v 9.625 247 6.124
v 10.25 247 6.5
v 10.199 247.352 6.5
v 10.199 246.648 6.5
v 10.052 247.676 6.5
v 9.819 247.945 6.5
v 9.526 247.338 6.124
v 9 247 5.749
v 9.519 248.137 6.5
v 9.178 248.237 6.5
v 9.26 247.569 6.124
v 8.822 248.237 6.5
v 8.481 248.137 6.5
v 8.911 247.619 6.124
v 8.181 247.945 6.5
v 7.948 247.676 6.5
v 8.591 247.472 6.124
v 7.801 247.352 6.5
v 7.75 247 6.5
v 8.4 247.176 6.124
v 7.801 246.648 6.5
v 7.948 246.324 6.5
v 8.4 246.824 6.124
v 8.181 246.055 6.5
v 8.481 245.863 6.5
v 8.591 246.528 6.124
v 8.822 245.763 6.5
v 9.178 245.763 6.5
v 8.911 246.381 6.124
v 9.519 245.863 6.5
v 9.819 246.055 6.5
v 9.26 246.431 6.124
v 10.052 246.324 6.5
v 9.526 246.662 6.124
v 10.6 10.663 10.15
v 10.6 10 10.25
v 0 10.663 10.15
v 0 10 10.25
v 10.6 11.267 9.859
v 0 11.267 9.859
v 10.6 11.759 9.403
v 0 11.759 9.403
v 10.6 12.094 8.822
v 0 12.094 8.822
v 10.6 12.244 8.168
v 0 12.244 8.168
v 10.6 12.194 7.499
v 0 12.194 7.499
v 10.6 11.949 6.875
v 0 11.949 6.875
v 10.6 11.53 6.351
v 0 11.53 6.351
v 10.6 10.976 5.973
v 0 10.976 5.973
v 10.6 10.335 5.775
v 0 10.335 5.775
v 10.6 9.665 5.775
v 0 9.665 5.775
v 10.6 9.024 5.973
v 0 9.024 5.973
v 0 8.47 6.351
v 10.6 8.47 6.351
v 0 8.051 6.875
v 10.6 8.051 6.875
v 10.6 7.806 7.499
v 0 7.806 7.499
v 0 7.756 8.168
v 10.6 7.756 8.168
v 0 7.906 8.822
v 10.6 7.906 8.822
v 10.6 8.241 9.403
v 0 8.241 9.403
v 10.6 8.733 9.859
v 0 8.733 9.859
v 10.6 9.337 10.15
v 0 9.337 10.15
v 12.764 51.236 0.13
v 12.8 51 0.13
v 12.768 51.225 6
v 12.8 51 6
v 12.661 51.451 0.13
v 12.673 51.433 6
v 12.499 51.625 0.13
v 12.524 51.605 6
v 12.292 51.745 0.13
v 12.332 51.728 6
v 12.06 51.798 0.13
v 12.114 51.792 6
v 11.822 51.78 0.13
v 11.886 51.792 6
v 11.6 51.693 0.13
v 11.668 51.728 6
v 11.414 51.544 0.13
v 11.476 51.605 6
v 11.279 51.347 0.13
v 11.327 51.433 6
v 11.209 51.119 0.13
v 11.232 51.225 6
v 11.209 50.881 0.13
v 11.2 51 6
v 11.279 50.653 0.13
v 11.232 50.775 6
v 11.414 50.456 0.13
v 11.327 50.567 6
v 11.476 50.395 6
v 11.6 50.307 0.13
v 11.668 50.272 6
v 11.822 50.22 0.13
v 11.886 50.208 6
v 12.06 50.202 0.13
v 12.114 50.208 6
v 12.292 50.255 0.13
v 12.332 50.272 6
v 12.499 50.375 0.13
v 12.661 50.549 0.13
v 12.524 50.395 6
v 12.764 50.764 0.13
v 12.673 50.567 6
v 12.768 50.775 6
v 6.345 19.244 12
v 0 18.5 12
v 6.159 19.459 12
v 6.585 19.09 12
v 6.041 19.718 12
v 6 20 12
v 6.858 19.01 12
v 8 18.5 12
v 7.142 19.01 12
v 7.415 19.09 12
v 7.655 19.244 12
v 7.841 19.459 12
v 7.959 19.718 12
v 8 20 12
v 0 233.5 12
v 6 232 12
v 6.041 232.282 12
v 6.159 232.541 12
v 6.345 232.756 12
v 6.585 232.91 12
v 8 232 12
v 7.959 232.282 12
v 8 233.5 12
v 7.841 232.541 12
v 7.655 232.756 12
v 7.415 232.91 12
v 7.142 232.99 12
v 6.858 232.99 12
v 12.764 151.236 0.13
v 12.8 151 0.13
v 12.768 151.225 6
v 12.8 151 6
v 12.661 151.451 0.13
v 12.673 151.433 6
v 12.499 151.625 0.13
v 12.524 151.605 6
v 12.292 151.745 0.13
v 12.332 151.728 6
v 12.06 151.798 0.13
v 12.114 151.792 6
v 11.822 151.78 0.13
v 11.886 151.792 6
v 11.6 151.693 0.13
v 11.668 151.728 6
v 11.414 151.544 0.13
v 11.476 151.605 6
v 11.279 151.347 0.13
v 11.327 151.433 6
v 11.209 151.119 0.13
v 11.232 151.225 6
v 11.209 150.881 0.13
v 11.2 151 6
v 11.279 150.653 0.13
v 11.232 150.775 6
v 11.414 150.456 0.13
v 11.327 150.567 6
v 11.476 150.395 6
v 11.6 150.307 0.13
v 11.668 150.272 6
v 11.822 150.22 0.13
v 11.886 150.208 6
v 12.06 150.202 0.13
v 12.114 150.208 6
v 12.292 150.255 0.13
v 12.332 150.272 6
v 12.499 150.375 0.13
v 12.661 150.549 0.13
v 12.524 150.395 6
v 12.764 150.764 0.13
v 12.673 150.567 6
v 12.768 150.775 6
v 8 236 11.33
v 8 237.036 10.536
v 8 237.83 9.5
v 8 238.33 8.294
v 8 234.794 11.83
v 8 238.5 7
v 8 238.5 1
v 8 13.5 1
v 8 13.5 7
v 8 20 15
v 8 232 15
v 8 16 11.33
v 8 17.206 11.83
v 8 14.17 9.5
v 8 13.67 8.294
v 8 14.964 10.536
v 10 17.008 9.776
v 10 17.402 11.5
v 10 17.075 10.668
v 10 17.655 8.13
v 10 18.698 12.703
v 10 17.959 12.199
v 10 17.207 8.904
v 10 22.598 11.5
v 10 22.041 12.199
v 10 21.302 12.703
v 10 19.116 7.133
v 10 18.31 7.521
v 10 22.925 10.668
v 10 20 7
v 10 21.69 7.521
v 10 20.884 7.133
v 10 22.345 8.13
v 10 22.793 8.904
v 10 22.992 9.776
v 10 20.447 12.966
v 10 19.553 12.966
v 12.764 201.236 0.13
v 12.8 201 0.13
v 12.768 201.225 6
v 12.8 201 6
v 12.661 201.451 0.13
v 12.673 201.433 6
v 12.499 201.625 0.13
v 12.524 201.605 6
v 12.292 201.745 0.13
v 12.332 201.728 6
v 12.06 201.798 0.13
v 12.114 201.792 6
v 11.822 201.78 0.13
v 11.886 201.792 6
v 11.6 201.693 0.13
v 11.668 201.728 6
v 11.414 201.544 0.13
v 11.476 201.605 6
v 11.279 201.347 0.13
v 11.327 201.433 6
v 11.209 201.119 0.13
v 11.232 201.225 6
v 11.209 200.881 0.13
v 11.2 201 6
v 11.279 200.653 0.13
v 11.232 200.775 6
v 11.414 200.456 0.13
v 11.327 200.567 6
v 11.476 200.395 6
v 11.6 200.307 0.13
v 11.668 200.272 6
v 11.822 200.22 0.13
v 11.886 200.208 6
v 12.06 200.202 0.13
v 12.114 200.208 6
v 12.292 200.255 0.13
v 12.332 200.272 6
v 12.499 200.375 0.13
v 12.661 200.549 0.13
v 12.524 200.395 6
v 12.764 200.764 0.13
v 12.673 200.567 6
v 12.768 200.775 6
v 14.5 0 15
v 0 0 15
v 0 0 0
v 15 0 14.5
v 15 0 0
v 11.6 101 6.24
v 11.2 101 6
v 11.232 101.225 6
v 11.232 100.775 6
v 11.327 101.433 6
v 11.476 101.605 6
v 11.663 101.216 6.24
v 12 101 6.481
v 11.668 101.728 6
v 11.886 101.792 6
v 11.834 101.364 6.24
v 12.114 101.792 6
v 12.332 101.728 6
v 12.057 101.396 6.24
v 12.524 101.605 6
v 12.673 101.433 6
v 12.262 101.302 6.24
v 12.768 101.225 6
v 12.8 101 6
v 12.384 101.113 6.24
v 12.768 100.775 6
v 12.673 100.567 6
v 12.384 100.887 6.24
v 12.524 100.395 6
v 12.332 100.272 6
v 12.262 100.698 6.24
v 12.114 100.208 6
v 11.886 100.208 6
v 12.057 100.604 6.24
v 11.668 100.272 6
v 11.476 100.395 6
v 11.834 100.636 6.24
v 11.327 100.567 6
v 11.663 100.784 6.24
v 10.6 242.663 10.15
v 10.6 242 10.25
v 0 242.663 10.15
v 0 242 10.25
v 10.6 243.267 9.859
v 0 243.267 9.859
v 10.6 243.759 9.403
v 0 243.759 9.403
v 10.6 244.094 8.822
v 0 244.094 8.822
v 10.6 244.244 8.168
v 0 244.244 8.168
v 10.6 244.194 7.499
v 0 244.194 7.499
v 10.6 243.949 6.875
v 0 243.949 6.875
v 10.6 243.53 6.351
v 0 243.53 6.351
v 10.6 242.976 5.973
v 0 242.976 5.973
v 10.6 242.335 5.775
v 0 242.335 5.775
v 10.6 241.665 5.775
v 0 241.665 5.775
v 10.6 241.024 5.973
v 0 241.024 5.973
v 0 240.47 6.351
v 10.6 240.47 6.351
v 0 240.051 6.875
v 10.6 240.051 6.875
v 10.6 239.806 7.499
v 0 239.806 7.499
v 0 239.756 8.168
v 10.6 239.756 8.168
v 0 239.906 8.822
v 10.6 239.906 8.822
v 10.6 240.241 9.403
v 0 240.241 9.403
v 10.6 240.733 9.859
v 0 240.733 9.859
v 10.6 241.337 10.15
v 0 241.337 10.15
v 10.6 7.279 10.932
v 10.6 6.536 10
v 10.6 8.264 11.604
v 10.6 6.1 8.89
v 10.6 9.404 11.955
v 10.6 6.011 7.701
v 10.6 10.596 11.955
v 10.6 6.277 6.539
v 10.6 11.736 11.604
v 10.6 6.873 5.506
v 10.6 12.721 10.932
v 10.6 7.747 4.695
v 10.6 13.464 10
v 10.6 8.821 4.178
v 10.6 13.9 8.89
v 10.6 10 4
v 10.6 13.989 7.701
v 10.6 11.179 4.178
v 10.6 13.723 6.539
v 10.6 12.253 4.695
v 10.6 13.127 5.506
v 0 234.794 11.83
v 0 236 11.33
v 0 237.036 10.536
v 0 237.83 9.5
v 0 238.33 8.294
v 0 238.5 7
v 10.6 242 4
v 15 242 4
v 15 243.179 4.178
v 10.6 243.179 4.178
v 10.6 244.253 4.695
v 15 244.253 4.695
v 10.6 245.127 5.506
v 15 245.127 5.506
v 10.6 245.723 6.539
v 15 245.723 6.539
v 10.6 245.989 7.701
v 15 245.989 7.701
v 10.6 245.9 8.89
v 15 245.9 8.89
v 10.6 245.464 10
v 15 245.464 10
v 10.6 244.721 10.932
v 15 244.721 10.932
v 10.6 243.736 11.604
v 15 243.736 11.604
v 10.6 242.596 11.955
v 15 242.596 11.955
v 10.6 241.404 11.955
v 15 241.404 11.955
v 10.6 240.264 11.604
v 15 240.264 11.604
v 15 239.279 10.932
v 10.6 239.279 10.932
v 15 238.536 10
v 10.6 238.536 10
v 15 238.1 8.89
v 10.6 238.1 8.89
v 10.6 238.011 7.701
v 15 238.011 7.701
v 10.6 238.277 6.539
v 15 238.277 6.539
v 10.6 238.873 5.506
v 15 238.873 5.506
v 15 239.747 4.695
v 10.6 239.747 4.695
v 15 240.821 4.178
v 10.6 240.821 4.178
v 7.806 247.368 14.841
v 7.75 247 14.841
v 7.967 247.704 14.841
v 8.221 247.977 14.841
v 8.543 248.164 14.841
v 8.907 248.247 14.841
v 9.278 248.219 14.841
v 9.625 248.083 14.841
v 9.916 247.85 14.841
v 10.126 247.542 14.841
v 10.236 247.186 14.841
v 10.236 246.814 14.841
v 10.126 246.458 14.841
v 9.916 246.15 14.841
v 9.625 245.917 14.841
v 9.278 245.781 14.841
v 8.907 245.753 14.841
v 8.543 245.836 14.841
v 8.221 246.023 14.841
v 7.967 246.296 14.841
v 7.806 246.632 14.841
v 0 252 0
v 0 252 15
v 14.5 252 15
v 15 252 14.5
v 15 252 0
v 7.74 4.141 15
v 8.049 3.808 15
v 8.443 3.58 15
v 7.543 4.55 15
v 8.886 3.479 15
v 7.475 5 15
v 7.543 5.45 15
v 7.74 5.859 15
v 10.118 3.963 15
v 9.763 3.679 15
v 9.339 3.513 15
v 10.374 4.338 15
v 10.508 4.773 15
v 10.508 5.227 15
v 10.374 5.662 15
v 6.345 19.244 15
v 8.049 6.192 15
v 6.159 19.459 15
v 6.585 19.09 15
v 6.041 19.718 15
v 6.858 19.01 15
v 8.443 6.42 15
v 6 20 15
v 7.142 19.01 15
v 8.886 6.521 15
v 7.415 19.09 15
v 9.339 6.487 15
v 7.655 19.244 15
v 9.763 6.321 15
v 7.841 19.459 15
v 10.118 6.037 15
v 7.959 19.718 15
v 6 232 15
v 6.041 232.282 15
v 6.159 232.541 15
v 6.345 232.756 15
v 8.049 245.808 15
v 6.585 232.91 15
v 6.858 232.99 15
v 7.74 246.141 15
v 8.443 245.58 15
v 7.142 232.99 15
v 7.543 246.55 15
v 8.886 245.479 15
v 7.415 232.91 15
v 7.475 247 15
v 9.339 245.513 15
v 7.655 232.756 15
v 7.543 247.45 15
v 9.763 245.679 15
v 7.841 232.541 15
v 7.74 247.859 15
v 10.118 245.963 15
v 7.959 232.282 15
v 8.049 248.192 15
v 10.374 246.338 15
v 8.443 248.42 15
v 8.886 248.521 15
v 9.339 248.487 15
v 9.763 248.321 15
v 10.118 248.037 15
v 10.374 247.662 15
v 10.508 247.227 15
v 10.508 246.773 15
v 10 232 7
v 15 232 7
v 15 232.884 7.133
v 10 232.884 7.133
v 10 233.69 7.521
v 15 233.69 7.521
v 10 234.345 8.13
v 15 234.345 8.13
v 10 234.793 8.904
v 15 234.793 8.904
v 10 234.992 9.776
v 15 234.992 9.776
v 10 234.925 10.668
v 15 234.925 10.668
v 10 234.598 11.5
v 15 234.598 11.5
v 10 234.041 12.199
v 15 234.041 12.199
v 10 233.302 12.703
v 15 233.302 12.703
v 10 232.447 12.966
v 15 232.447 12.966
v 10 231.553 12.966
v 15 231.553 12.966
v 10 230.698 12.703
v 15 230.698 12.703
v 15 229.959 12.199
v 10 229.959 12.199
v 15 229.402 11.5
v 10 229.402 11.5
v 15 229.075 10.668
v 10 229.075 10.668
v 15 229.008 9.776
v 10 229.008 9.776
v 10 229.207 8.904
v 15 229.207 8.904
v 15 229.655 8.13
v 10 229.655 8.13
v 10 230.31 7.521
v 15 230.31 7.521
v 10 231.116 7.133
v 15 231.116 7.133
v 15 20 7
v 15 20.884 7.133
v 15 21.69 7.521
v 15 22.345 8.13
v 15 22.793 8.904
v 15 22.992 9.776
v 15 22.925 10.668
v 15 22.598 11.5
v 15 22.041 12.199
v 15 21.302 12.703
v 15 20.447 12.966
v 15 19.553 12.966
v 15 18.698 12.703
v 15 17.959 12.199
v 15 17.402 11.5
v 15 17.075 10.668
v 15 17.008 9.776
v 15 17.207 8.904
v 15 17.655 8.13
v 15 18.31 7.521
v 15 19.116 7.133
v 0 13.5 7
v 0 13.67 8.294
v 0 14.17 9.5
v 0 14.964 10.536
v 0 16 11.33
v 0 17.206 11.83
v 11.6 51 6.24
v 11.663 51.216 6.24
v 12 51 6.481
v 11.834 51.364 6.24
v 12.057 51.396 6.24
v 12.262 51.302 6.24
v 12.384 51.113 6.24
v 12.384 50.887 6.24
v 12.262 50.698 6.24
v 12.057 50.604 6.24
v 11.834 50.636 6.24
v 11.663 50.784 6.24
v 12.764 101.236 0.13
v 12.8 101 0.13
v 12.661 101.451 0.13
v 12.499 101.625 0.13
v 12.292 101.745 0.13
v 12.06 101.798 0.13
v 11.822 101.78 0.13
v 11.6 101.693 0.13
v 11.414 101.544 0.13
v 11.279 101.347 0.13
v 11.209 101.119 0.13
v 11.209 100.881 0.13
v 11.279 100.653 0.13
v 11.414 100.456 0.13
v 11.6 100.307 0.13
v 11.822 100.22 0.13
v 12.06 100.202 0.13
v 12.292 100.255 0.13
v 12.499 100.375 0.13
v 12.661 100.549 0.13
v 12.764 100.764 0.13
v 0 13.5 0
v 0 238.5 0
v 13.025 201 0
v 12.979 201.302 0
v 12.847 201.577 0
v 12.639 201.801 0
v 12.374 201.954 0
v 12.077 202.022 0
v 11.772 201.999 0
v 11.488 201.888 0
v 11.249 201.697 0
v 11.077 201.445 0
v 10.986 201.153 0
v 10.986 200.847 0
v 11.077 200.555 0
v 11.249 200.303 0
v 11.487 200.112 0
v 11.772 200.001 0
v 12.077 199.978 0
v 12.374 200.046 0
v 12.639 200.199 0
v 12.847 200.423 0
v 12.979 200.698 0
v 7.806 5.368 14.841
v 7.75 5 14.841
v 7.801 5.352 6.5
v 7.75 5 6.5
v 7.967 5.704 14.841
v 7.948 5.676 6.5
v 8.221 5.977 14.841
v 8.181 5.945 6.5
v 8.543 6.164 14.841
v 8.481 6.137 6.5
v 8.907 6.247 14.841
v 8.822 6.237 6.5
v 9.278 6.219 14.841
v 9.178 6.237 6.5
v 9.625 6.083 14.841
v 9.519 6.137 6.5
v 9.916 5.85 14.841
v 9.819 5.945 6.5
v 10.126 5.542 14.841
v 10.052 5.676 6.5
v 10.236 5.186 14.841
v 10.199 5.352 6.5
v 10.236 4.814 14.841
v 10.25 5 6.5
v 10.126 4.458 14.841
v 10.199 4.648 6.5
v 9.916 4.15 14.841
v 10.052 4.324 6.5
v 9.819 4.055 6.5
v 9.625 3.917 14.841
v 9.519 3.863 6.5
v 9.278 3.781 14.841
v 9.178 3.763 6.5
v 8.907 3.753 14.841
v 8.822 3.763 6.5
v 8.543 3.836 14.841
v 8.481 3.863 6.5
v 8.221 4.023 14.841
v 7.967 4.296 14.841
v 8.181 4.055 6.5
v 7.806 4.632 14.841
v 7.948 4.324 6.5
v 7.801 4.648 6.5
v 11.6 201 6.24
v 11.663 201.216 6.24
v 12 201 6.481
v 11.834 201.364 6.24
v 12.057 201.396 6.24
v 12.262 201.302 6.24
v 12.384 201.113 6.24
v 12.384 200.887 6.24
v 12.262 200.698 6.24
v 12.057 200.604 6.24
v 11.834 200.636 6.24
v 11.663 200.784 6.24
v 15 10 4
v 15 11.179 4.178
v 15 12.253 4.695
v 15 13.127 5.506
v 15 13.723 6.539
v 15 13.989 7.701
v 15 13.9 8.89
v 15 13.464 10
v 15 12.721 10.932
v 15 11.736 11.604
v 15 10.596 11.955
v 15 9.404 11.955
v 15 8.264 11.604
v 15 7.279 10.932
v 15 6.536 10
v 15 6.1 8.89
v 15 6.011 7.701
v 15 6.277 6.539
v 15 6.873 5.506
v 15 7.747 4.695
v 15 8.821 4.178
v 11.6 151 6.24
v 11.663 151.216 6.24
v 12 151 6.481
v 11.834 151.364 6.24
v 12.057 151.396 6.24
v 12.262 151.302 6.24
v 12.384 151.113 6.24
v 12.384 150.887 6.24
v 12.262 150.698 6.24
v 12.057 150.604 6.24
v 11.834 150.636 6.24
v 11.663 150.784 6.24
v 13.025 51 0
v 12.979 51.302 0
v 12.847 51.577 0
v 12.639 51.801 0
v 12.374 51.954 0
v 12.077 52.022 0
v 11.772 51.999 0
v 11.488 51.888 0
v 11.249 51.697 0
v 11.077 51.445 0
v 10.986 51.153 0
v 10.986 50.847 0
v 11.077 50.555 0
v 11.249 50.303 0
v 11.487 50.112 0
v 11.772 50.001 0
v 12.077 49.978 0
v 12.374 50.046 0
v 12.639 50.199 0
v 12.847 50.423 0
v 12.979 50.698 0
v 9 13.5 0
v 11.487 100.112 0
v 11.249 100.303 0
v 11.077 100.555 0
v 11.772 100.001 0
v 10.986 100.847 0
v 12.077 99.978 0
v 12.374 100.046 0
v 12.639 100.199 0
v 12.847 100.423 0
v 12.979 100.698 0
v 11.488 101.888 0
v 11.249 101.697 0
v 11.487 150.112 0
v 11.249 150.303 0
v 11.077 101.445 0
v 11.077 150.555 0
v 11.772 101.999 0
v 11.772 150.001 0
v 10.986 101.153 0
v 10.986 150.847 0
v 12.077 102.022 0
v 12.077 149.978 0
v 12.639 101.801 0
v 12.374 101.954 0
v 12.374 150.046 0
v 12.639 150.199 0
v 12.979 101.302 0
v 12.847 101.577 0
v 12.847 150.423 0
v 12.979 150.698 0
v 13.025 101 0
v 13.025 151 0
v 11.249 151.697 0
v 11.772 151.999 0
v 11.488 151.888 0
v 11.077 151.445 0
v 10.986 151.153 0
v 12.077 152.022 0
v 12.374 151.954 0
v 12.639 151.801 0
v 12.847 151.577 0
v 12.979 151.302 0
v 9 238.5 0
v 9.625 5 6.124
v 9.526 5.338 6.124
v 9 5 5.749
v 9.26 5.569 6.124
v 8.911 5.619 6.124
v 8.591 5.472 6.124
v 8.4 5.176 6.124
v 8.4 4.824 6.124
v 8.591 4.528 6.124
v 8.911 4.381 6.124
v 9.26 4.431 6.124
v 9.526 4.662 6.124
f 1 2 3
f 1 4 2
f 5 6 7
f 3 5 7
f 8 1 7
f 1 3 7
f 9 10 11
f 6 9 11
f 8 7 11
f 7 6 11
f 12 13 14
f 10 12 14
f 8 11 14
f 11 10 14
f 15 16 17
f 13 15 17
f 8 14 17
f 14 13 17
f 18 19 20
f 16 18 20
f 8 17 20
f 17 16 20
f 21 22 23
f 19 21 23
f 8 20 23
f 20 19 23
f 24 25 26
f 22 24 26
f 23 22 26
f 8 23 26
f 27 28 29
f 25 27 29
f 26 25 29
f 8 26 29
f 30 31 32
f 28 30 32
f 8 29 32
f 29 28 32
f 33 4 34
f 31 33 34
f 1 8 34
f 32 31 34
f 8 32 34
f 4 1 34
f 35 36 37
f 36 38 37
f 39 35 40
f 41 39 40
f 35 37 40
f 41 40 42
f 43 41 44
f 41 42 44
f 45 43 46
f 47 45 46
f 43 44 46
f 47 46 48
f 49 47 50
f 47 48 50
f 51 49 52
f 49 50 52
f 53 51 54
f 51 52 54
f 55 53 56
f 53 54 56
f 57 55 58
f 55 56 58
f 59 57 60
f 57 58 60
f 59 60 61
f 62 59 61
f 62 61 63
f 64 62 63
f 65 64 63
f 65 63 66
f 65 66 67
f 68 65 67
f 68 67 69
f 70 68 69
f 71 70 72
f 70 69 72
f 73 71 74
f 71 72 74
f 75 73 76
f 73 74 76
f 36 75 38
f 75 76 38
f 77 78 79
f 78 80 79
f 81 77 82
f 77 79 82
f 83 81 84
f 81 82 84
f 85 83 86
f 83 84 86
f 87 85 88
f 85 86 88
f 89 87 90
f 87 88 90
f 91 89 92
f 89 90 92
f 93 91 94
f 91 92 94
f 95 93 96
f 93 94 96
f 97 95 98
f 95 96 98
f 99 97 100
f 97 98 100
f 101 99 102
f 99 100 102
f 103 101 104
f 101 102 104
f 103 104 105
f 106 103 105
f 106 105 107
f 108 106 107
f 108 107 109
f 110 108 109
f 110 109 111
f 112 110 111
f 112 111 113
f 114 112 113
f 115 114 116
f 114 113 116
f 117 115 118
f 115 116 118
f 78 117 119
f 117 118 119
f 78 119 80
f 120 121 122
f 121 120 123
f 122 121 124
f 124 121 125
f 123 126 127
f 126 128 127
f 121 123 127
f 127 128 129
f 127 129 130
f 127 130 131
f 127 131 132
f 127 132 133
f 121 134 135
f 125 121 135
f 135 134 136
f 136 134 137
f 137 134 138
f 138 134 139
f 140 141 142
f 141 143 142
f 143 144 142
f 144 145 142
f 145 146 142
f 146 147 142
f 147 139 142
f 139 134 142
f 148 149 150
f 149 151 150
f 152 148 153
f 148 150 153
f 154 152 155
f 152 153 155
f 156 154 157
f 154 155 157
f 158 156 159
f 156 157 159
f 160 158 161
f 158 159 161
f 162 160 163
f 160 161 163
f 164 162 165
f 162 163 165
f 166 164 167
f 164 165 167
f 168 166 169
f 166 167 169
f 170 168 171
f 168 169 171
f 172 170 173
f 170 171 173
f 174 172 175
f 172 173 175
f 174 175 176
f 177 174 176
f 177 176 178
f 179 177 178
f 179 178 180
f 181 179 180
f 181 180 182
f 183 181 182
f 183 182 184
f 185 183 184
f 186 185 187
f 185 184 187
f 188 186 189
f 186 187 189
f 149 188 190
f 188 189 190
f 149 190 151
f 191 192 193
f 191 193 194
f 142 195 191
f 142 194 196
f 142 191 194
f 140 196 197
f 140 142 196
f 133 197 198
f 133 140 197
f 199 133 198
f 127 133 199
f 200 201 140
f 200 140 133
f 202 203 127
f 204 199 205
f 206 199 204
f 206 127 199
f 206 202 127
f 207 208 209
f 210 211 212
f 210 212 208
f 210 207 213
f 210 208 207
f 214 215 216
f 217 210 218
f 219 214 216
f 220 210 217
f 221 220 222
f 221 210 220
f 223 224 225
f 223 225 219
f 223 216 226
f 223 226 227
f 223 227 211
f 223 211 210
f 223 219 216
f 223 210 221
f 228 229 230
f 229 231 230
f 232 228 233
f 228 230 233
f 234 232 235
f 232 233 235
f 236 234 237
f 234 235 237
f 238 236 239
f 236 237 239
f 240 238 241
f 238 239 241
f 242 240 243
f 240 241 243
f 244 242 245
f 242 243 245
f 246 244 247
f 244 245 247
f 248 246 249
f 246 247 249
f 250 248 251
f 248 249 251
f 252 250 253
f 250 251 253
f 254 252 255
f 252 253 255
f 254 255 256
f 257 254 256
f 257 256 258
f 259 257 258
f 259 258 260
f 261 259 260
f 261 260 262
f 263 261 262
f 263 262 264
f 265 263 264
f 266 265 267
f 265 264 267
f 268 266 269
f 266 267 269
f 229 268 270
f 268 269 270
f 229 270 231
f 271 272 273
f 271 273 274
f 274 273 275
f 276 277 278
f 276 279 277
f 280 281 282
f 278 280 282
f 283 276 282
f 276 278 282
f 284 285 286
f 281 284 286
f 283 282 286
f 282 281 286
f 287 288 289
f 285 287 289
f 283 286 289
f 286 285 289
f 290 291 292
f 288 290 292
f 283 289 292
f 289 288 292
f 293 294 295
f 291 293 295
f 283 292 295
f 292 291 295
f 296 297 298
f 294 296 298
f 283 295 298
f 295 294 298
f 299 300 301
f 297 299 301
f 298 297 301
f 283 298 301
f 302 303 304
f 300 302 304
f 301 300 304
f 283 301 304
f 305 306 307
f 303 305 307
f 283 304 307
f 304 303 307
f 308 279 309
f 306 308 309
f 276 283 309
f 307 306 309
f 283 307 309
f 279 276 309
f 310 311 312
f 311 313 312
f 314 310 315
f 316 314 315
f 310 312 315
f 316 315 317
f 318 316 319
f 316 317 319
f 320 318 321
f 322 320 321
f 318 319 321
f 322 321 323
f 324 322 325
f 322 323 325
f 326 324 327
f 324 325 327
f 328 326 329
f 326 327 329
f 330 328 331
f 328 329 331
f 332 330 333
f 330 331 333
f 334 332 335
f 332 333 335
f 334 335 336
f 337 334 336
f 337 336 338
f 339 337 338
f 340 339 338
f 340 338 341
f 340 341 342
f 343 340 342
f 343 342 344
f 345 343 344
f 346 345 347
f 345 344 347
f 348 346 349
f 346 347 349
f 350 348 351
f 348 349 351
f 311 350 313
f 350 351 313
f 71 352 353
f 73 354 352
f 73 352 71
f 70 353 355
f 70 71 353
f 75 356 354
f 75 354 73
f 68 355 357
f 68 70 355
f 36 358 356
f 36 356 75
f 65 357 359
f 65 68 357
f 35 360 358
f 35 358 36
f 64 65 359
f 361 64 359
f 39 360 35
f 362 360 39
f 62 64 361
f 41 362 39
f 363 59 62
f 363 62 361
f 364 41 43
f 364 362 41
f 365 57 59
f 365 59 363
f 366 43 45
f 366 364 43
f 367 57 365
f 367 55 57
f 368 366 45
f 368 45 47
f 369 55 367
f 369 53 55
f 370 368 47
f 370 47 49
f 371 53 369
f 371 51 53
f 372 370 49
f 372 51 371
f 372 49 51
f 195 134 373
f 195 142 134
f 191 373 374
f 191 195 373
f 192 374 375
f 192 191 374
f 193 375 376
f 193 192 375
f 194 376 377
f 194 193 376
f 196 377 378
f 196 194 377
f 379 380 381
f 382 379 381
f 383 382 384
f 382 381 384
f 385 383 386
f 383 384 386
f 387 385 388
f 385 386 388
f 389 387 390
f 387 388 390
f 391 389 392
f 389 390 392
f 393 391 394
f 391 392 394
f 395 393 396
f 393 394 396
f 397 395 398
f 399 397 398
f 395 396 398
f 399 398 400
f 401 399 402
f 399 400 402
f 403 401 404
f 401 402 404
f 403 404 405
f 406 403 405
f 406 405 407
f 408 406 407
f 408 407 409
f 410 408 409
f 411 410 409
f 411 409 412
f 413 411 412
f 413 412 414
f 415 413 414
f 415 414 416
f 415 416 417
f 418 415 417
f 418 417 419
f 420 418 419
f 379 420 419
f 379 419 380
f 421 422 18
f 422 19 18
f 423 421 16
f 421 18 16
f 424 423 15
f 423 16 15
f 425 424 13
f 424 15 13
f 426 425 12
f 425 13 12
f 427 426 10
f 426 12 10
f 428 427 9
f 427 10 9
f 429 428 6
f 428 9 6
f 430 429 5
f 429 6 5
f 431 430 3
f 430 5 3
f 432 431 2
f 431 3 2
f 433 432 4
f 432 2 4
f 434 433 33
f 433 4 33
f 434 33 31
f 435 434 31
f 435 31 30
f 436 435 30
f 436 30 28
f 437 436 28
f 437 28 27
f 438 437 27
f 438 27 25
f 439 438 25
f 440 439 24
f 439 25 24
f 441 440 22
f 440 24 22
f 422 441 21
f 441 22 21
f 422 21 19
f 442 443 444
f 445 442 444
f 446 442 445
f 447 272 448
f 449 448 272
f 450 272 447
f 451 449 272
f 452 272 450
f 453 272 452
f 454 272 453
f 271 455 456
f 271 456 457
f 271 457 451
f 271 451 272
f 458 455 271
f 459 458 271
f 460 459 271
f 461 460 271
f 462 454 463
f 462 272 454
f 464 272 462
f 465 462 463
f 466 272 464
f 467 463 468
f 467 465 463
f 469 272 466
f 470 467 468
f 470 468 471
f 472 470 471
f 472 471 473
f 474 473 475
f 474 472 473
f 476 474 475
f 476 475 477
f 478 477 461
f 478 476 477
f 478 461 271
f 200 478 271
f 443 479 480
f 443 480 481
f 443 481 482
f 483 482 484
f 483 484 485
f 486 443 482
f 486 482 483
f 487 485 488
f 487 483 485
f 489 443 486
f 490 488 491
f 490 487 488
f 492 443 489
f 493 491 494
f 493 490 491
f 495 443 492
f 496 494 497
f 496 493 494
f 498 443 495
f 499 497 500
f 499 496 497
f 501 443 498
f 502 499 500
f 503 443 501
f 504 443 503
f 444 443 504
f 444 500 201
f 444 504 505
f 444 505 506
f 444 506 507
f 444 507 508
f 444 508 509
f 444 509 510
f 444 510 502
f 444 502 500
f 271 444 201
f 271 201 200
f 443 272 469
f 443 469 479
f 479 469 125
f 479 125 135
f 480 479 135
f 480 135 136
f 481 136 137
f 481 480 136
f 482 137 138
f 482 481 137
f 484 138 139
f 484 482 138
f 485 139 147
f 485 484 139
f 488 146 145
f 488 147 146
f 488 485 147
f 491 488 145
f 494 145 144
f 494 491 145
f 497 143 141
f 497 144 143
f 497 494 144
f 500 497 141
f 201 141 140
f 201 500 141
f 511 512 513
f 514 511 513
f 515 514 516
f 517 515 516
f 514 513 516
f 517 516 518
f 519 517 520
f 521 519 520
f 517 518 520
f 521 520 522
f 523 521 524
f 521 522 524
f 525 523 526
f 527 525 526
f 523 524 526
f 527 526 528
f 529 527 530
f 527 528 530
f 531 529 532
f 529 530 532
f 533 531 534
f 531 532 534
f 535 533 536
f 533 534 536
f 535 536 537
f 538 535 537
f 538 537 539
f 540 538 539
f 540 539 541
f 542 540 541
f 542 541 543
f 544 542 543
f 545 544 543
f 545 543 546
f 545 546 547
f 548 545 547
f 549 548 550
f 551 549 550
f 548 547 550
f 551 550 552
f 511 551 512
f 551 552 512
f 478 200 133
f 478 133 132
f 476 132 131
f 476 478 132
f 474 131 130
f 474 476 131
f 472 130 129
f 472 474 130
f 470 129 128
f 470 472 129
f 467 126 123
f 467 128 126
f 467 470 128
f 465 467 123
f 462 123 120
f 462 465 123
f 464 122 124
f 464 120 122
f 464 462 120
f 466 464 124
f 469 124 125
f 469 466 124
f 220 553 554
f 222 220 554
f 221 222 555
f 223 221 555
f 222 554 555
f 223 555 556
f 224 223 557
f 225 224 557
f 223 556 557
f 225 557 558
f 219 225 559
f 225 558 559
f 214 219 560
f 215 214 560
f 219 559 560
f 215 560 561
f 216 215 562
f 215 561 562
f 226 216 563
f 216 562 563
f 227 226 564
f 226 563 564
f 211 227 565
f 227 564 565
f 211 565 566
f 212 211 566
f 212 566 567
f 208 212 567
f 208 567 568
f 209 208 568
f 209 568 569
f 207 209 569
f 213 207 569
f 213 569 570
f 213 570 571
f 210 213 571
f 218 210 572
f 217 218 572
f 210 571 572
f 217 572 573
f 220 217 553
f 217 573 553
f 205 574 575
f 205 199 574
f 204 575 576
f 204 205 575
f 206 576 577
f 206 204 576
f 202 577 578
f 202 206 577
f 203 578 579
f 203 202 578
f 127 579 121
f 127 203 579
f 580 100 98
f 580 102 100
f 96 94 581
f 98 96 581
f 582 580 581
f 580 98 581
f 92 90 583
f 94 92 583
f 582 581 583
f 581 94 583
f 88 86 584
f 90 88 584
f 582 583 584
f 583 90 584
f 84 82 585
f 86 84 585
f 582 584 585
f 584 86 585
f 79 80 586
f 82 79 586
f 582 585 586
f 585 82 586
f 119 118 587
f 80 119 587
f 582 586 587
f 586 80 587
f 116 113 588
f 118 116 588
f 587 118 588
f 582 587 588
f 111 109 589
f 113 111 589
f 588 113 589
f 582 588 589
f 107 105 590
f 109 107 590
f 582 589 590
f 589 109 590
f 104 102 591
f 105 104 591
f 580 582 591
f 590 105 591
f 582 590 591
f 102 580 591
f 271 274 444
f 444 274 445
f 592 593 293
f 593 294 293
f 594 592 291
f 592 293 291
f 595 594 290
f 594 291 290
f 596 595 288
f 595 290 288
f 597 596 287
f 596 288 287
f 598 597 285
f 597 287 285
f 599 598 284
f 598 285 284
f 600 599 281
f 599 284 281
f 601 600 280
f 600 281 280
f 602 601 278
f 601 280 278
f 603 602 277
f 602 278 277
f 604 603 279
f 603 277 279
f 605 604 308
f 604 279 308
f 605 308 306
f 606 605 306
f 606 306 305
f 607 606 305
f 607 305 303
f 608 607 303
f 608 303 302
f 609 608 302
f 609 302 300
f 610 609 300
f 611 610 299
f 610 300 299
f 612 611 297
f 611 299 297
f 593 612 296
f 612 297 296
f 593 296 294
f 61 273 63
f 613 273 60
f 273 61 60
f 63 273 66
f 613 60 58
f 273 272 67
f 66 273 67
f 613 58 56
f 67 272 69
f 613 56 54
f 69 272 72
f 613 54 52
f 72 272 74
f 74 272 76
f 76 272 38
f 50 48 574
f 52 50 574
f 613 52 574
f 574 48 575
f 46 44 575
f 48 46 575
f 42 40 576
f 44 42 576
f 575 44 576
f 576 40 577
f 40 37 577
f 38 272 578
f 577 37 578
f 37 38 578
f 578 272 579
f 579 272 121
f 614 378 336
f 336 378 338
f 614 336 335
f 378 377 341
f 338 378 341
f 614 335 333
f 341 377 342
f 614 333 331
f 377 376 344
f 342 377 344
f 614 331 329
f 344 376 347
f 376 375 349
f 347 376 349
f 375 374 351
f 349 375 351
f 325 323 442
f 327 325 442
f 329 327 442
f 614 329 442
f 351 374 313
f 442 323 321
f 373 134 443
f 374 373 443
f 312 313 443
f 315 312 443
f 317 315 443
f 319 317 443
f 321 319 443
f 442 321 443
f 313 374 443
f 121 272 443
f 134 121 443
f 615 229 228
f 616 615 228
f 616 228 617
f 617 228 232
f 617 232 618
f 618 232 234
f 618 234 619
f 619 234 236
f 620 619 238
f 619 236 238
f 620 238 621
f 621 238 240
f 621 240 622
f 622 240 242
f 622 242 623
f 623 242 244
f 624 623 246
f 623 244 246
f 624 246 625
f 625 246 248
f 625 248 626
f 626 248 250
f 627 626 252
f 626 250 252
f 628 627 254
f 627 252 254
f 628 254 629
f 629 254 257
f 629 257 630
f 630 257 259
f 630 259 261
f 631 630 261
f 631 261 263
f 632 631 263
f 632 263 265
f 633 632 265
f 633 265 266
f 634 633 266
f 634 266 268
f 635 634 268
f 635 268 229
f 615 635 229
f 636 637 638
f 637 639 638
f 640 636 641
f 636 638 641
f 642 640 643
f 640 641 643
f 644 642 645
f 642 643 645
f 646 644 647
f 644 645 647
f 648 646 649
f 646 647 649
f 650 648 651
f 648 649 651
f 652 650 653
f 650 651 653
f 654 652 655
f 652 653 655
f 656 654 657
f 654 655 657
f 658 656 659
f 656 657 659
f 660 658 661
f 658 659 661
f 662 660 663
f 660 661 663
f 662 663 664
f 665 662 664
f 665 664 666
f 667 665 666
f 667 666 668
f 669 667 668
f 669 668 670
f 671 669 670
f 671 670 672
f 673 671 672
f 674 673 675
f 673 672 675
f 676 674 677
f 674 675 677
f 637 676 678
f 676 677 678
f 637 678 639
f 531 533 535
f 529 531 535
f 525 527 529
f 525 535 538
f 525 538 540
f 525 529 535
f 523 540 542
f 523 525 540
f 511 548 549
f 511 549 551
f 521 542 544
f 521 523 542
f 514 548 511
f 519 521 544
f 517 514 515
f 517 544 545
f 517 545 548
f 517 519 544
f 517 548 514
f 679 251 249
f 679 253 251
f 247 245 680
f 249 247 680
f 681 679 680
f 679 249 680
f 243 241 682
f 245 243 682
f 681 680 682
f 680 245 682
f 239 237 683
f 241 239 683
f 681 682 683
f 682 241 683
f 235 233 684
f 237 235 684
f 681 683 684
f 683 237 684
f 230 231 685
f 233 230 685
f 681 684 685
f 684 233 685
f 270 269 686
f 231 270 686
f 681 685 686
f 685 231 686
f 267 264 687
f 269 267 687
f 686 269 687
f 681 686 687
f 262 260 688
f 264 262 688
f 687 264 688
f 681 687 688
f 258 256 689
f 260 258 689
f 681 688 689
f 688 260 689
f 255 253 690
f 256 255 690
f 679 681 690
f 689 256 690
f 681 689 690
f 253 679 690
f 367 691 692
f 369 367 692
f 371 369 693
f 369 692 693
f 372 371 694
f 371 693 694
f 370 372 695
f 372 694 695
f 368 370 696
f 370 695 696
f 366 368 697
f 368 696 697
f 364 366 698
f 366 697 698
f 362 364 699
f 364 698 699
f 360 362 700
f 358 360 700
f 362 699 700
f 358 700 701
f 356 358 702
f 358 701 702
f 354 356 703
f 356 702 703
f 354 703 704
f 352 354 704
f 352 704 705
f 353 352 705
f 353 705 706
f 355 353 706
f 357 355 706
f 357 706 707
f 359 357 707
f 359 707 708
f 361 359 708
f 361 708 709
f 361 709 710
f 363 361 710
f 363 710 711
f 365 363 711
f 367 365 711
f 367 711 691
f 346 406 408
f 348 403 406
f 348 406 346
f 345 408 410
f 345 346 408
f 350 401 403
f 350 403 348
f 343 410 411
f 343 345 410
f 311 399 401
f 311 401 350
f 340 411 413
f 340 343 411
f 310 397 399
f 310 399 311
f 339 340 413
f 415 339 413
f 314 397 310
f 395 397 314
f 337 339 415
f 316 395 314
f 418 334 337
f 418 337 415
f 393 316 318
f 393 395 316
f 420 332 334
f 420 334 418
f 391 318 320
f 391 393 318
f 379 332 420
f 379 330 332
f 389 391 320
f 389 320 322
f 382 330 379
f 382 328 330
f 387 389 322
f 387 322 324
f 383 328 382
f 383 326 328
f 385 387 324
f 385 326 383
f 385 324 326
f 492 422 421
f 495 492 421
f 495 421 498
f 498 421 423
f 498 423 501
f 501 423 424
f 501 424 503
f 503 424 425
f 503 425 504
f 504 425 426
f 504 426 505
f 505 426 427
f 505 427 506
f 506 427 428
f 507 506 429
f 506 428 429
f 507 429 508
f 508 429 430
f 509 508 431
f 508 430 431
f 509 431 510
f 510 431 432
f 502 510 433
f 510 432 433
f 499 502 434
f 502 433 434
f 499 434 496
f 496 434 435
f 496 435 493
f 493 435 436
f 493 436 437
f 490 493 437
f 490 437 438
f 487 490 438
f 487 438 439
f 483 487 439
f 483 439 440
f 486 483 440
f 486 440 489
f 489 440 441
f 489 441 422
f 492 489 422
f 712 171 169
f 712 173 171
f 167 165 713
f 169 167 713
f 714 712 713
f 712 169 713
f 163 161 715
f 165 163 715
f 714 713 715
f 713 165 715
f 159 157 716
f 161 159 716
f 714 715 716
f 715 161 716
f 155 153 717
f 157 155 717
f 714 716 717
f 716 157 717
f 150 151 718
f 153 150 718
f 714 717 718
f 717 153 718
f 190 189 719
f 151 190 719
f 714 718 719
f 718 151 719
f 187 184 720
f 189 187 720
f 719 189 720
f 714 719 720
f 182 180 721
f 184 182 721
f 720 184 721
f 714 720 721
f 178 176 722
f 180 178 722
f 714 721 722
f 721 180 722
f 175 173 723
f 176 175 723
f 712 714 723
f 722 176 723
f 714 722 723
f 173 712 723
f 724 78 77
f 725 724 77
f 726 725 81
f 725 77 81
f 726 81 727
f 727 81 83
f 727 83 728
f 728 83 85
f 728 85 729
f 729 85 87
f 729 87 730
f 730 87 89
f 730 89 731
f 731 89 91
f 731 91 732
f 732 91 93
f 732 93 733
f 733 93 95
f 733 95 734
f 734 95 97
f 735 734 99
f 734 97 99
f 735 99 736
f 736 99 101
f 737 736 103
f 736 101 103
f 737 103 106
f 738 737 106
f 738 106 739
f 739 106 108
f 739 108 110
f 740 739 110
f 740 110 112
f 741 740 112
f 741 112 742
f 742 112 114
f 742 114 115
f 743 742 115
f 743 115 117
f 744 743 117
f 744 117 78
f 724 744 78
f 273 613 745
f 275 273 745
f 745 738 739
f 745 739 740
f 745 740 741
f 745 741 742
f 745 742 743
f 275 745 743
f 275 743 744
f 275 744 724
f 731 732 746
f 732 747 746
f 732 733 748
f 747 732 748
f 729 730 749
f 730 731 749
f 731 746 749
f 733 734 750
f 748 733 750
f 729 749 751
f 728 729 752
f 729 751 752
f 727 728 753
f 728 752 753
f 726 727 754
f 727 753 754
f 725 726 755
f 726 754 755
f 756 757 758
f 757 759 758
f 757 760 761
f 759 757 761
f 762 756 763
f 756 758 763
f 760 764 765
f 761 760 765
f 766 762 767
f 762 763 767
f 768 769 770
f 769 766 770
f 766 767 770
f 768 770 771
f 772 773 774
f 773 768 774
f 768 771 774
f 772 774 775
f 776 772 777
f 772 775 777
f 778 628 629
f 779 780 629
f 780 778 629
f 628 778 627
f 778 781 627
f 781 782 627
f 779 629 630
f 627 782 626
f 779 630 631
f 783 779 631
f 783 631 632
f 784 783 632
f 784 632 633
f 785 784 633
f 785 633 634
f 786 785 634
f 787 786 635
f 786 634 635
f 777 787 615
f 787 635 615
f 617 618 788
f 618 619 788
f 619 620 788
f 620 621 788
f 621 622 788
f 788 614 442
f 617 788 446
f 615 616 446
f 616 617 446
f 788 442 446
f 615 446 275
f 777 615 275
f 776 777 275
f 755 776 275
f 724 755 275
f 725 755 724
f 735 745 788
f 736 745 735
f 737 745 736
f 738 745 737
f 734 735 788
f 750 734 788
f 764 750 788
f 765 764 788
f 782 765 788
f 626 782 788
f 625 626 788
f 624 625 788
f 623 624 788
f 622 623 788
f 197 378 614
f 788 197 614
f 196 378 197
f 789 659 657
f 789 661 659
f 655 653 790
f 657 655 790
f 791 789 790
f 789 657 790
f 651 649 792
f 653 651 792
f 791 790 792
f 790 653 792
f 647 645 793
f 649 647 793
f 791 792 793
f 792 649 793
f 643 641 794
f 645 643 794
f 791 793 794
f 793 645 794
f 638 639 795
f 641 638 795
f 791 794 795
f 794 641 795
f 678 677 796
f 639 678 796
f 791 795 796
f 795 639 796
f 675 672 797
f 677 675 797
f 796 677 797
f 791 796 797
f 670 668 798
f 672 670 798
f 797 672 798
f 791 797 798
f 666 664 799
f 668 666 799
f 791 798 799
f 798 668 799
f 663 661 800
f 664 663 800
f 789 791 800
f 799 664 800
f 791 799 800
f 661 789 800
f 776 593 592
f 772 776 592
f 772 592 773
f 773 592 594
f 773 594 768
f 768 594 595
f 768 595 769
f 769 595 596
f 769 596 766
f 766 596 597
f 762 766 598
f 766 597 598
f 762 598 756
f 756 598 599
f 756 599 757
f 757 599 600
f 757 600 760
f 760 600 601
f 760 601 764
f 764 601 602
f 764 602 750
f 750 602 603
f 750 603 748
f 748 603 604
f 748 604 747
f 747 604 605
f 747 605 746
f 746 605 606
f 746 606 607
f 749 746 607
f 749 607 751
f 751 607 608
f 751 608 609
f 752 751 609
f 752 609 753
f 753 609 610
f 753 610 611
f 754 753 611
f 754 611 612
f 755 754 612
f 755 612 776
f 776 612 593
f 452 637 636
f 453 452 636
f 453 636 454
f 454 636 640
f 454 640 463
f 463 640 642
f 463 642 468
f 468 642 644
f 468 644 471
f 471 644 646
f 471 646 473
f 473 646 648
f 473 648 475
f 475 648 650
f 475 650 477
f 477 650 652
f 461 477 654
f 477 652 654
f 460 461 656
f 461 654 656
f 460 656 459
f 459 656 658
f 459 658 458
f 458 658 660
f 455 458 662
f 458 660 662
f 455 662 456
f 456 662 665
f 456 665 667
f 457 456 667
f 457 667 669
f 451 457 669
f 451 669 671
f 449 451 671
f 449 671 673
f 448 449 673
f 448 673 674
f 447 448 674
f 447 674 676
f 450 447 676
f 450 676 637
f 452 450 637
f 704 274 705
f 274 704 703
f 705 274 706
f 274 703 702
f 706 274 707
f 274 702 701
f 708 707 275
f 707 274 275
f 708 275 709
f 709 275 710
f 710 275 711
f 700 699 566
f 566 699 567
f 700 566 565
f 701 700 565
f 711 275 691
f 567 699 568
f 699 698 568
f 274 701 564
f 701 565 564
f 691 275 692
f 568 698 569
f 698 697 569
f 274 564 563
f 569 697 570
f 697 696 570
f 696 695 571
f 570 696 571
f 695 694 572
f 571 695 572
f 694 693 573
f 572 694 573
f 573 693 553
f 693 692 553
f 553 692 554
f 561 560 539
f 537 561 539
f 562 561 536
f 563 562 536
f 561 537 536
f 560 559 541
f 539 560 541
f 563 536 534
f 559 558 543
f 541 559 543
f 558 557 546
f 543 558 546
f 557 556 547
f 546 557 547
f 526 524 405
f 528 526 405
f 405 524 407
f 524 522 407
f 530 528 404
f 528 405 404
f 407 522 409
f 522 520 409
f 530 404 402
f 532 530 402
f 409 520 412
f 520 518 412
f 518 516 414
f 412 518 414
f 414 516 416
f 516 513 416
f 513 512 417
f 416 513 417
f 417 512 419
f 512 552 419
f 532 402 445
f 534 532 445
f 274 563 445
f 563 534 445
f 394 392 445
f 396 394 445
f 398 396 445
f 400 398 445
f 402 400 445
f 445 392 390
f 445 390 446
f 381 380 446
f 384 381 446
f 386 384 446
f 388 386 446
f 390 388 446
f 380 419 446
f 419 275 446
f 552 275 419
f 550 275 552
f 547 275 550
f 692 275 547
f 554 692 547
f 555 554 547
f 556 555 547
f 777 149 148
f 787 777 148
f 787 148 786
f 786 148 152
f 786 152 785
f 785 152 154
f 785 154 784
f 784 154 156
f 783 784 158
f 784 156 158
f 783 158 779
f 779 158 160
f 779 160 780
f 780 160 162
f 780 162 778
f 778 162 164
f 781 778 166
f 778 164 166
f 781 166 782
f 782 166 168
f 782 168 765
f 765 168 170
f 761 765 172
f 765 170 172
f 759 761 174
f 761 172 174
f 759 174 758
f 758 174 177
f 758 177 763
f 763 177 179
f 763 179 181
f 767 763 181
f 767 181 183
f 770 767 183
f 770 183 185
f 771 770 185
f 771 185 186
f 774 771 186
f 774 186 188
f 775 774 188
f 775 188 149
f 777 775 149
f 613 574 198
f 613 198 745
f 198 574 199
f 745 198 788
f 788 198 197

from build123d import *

# Parameters (mm, degrees)
SKETCH_1_W                  = 15
SKETCH_1_H                  = 252
EXTRUDE_1_DEPTH             = 15
EXTRUDE_2_DEPTH             = 6
SKETCH_3_W                  = 8
SKETCH_3_H                  = 225
CUT_EXTRUDE_1_DEPTH         = 253.891280988
SKETCH_7_W                  = 15
SKETCH_7_H                  = 6
CUT_EXTRUDE_4_DEPTH         = 245.863737617
SKETCH_5_W                  = 8
SKETCH_5_H                  = 225
EXTRUDE_3_DEPTH             = 3
CUT_EXTRUDE_3_DEPTH         = 8
FILLET_1_R                  = 5
CHAMFER_1_SIZE              = 0.5
HOLE_WIZARD_M31_D           = 2.5
HOLE_WIZARD_M31_DEPTH       = 8.5
HOLE_WIZARD_M31_CSINK_D     = 3.05
HOLE_WIZARD_M31_CSINK_ANGLE = 120
HOLE_WIZARD_M31_TIP         = 0.751075774
HOLE_WIZARD_M41_D           = 4.5
HOLE_WIZARD_M41_CBORE_D     = 8
HOLE_WIZARD_M41_CBORE_DEPTH = 4.4
SKETCH_12_R                 = 3
CUT_EXTRUDE_5_DEPTH         = 5
CHAMFER_2_SIZE              = 1
HOLE_WIZARD_M21_D           = 1.6
HOLE_WIZARD_M21_DEPTH       = 6
HOLE_WIZARD_M21_CSINK_D     = 2.05
HOLE_WIZARD_M21_CSINK_ANGLE = 120
HOLE_WIZARD_M21_TIP         = 0.480688495


with BuildPart() as part:
    # Эскиз1 → Бобышка-Вытянуть1 (new body)
    with BuildSketch(Plane.XY):
        with Locations((7.5, 126)):
            Rectangle(SKETCH_1_W, SKETCH_1_H)
    extrude(amount=EXTRUDE_1_DEPTH)

    # Эскиз2 → Бобышка-Вытянуть2 (add)
    with BuildSketch(Plane.XY.offset(15)):
        Polygon((15, 8.5), (15, 243.5), (0, 243.5), (0, 238.5), (8, 238.5), (8, 13.5), (0, 13.5), (0, 8.5), align=None)
    extrude(amount=EXTRUDE_2_DEPTH)

    # Эскиз3 → Вырез-Вытянуть1 (cut, through all)
    with BuildSketch(Plane.XY.offset(15)):
        with Locations((4, 126)):
            Rectangle(SKETCH_3_W, SKETCH_3_H)
    extrude(amount=-CUT_EXTRUDE_1_DEPTH, mode=Mode.SUBTRACT)

    # Эскиз7 → Вырез-Вытянуть4 (cut, through all)
    with BuildSketch(Plane(origin=(0, 243.5, 0), x_dir=(1, 0, 0), z_dir=(0, 1, 0))):
        with Locations((7.5, -18)):
            Rectangle(SKETCH_7_W, SKETCH_7_H)
    extrude(amount=-CUT_EXTRUDE_4_DEPTH, mode=Mode.SUBTRACT)

    # Эскиз5 → Бобышка-Вытянуть3 (add)
    with BuildSketch(Plane.XY.offset(15)):
        with Locations((4, 126)):
            Rectangle(SKETCH_5_W, SKETCH_5_H)
    extrude(amount=-EXTRUDE_3_DEPTH)

    # Эскиз6 → Вырез-Вытянуть3 (cut)
    with BuildSketch(Plane.XY.offset(15)):
        with BuildLine():
            Line((8, 232), (8, 20))
            ThreePointArc((8, 20), (7, 19), (6, 20))
            Line((6, 20), (6, 232))
            ThreePointArc((6, 232), (7, 233), (8, 232))
        make_face()
    extrude(amount=-CUT_EXTRUDE_3_DEPTH, mode=Mode.SUBTRACT)

    # Скругление1
    fillet_1_edges = [part.edges().sort_by_distance(p)[0] for p in [
        (4, 238.5, 12),
        (4, 13.5, 12),
    ]]
    fillet(fillet_1_edges, radius=FILLET_1_R)

    # Фаска1
    chamfer_1_edges = [part.edges().sort_by_distance(p)[0] for p in [
        (15, 126, 15),
    ]]
    chamfer(chamfer_1_edges, length=CHAMFER_1_SIZE)

    # Отверстие обработанное метчиком M31
    with Locations(Plane.XY.offset(15)):
        with Locations((9, 5), (9, 247)):
            CounterSinkHole(HOLE_WIZARD_M31_D / 2, HOLE_WIZARD_M31_CSINK_D / 2, depth=HOLE_WIZARD_M31_DEPTH, counter_sink_angle=HOLE_WIZARD_M31_CSINK_ANGLE)
            with Locations((0, 0, -(HOLE_WIZARD_M31_DEPTH + HOLE_WIZARD_M31_TIP / 2))):  # 118° drill point
                Cone(0, HOLE_WIZARD_M31_D / 2, HOLE_WIZARD_M31_TIP, mode=Mode.SUBTRACT)

    # Цековка для  винта с внутренним шестигранником M41 (through all)
    with Locations(Plane(origin=(15, 0, 0), x_dir=(0, 0, -1), z_dir=(1, 0, 0))):
        with Locations((-8, 10), (-8, 242)):
            CounterBoreHole(HOLE_WIZARD_M41_D / 2, HOLE_WIZARD_M41_CBORE_D / 2, HOLE_WIZARD_M41_CBORE_DEPTH)

    # Эскиз12 → Вырез-Вытянуть5 (cut)
    with BuildSketch(Plane(origin=(15, 0, 0), x_dir=(0, 0, -1), z_dir=(1, 0, 0))):
        with Locations((-10, 232)):
            Circle(SKETCH_12_R)
        with Locations((-10, 20)):
            Circle(SKETCH_12_R)
    extrude(amount=-CUT_EXTRUDE_5_DEPTH, mode=Mode.SUBTRACT)

    # Фаска2
    chamfer_2_edges = [part.edges().sort_by_distance(p)[0] for p in [
        (8, 126, 0),
    ]]
    chamfer(chamfer_2_edges, length=CHAMFER_2_SIZE)

    # Отверстие обработанное метчиком M21
    with Locations(Plane(origin=(0, 0, 0), x_dir=(-1, 0, 0), z_dir=(0, 0, -1))):
        with Locations((-12, 101), (-12, 201), (-12, 151), (-12, 51)):
            CounterSinkHole(HOLE_WIZARD_M21_D / 2, HOLE_WIZARD_M21_CSINK_D / 2, depth=HOLE_WIZARD_M21_DEPTH, counter_sink_angle=HOLE_WIZARD_M21_CSINK_ANGLE)
            with Locations((0, 0, -(HOLE_WIZARD_M21_DEPTH + HOLE_WIZARD_M21_TIP / 2))):  # 118° drill point
                Cone(0, HOLE_WIZARD_M21_D / 2, HOLE_WIZARD_M21_TIP, mode=Mode.SUBTRACT)


solid = part.part
